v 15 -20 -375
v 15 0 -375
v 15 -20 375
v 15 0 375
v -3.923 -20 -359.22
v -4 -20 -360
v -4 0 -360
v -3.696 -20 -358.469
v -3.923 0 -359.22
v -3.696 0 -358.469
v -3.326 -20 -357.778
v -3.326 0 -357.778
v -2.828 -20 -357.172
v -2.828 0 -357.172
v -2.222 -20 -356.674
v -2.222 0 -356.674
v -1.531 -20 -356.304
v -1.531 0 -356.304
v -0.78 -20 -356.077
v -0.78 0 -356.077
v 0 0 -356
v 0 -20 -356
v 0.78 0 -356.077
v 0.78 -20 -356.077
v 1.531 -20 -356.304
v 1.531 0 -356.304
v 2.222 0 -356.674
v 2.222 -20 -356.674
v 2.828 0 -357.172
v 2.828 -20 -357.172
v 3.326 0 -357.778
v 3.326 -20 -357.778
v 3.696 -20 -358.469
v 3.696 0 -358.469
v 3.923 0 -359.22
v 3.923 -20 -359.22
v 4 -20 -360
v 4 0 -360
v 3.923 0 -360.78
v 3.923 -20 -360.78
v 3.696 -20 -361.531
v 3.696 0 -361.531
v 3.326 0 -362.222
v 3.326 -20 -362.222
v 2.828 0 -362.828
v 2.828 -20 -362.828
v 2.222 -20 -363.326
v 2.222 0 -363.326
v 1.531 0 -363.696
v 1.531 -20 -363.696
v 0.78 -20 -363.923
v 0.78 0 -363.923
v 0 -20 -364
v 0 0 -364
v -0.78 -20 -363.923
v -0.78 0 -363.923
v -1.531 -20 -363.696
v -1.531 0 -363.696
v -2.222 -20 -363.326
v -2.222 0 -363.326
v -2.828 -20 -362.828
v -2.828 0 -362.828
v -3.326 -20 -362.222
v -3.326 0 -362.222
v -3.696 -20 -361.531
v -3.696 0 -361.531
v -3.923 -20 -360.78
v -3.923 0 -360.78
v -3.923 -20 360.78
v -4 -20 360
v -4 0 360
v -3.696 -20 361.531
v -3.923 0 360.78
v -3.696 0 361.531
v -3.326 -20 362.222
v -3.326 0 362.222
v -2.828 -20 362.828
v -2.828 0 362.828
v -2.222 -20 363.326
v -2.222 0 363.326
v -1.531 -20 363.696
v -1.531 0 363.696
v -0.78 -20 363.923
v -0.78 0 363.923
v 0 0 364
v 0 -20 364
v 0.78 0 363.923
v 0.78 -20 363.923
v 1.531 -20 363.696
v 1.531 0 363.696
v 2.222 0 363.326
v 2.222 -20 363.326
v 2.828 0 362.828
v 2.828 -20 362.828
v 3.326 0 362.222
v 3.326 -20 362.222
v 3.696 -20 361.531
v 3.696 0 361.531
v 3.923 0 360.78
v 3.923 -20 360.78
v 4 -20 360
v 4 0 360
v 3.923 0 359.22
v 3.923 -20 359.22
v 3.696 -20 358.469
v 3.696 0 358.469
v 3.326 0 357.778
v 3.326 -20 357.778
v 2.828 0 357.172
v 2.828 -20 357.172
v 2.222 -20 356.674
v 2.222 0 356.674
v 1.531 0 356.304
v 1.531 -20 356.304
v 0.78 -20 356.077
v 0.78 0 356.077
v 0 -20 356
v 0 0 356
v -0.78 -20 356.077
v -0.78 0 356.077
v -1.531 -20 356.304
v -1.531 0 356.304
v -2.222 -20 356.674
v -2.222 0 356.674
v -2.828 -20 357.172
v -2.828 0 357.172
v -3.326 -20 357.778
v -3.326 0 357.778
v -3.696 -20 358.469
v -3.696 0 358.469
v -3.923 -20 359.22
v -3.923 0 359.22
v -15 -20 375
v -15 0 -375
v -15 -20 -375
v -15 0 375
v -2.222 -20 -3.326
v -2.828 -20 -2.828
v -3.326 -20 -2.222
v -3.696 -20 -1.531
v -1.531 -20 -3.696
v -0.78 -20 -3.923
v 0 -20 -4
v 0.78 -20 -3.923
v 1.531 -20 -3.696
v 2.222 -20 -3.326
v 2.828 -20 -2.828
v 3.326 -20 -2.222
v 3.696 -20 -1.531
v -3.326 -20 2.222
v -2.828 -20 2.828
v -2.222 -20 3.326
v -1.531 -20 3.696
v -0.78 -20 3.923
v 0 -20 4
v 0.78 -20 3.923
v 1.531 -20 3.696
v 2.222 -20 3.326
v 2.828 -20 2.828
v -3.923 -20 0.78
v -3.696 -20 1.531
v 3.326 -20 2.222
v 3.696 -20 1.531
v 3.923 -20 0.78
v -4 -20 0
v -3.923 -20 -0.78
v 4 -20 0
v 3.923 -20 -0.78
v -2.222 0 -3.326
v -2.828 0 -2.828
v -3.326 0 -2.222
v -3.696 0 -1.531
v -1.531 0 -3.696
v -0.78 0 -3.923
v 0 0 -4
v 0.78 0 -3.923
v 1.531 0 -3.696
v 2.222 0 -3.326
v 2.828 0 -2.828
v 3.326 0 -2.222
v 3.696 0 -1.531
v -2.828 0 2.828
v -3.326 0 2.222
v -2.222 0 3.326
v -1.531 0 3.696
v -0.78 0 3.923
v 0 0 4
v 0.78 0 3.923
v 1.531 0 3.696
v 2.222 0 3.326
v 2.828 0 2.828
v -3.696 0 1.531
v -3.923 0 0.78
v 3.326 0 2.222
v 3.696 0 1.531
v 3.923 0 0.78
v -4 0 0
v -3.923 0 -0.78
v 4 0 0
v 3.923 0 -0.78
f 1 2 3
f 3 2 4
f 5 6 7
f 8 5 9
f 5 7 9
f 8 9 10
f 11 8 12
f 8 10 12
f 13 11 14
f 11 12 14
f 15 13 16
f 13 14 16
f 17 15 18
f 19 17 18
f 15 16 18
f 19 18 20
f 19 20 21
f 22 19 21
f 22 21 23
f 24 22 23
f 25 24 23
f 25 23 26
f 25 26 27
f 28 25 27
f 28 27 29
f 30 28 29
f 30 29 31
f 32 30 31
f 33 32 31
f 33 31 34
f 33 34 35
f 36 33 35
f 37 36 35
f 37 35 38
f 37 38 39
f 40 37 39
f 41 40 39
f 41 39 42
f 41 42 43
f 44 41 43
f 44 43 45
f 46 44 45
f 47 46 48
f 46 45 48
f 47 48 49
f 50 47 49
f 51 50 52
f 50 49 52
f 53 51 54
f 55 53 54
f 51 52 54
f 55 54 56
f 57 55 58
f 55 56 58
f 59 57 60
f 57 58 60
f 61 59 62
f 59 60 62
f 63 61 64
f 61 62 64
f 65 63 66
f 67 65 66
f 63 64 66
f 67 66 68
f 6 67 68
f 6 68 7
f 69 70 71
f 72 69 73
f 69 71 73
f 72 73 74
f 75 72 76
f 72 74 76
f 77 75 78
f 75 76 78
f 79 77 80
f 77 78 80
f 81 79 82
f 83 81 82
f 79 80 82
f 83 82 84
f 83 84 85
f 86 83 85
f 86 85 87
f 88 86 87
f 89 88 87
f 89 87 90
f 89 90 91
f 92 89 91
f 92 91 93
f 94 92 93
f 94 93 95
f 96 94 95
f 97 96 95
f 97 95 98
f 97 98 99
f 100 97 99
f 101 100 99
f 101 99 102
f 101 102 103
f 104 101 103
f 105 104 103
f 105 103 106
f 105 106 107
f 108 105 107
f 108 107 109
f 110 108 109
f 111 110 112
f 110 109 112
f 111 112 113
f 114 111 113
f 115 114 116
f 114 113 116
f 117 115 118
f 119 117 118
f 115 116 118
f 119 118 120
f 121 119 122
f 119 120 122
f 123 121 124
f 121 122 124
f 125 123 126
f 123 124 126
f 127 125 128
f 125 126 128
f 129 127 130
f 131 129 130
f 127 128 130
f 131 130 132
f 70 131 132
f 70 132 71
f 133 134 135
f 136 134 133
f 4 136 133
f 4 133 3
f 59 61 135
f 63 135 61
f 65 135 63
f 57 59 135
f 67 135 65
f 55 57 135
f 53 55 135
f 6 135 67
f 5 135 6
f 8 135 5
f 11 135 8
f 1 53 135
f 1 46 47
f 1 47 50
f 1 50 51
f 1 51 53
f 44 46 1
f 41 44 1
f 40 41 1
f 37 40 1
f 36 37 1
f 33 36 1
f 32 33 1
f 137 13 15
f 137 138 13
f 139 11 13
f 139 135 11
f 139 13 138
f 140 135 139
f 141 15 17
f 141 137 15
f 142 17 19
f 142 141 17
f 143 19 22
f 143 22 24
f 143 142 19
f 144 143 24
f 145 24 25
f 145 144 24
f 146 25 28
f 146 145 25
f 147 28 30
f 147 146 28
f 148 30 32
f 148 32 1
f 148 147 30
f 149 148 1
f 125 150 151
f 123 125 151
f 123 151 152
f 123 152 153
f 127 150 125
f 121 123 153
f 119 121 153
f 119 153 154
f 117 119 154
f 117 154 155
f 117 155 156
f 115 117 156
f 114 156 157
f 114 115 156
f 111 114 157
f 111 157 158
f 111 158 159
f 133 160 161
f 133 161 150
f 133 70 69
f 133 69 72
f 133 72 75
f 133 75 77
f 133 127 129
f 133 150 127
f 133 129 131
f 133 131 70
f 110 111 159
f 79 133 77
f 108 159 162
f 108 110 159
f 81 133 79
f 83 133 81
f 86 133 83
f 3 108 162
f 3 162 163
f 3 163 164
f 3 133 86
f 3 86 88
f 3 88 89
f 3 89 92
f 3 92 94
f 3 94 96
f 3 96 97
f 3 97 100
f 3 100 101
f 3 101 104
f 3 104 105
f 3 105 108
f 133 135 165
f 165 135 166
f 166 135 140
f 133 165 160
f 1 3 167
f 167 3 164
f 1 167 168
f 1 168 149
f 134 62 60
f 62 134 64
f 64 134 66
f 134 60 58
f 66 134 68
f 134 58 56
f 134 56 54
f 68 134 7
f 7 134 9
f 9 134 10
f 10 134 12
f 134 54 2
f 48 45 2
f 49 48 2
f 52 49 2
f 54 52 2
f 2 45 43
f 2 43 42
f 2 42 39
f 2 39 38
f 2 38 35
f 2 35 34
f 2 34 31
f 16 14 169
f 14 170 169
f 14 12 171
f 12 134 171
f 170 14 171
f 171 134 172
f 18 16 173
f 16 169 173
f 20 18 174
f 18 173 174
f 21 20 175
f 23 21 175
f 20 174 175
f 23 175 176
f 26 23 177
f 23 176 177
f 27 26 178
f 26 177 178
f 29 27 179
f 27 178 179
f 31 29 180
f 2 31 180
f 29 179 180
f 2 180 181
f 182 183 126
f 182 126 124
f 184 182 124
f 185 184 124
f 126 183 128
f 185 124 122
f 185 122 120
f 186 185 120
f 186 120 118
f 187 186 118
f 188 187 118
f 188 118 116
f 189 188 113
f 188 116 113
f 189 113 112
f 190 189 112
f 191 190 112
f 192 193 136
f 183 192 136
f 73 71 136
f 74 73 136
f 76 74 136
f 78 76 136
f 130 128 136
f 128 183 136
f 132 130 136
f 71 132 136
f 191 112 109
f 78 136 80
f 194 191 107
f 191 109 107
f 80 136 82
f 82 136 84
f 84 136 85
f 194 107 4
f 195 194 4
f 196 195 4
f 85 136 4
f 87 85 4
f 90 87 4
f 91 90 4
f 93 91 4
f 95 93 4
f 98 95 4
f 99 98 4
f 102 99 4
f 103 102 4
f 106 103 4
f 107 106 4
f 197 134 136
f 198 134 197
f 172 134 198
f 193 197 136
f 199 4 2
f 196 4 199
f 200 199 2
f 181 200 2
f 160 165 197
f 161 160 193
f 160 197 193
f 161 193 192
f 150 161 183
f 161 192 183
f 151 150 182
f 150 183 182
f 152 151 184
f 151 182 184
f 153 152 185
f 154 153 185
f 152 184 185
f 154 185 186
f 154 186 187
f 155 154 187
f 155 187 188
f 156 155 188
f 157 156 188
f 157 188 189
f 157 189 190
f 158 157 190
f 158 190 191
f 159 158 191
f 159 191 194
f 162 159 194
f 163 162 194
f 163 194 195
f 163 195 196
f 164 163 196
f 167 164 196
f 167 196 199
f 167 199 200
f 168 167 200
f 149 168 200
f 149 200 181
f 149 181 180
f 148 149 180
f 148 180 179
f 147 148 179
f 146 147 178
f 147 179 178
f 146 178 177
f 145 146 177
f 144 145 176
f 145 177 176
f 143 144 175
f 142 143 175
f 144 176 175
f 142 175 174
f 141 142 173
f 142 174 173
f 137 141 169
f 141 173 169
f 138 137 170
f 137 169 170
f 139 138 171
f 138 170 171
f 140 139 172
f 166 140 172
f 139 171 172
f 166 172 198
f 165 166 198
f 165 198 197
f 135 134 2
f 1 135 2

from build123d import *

# Parameters (mm, degrees)
F0_W     = 30
F0_H     = 750
F1_DEPTH = 20
F3_D     = 8
F5_D     = 8


with BuildPart() as f1:
    # F0 (on Front) → F1 (new body)
    with BuildSketch(Plane.XZ):
        Rectangle(F0_W, F0_H)
    extrude(amount=F1_DEPTH)

    # F3 (through all)
    with Locations(Plane.XZ.offset(20)):
        with Locations((0, 360), (0, -360)):
            Hole(F3_D / 2)

    # F5 (through all)
    with Locations(Plane.XZ.offset(20)):
        with Locations((0, 0)):
            Hole(F5_D / 2)


solid = f1.part
